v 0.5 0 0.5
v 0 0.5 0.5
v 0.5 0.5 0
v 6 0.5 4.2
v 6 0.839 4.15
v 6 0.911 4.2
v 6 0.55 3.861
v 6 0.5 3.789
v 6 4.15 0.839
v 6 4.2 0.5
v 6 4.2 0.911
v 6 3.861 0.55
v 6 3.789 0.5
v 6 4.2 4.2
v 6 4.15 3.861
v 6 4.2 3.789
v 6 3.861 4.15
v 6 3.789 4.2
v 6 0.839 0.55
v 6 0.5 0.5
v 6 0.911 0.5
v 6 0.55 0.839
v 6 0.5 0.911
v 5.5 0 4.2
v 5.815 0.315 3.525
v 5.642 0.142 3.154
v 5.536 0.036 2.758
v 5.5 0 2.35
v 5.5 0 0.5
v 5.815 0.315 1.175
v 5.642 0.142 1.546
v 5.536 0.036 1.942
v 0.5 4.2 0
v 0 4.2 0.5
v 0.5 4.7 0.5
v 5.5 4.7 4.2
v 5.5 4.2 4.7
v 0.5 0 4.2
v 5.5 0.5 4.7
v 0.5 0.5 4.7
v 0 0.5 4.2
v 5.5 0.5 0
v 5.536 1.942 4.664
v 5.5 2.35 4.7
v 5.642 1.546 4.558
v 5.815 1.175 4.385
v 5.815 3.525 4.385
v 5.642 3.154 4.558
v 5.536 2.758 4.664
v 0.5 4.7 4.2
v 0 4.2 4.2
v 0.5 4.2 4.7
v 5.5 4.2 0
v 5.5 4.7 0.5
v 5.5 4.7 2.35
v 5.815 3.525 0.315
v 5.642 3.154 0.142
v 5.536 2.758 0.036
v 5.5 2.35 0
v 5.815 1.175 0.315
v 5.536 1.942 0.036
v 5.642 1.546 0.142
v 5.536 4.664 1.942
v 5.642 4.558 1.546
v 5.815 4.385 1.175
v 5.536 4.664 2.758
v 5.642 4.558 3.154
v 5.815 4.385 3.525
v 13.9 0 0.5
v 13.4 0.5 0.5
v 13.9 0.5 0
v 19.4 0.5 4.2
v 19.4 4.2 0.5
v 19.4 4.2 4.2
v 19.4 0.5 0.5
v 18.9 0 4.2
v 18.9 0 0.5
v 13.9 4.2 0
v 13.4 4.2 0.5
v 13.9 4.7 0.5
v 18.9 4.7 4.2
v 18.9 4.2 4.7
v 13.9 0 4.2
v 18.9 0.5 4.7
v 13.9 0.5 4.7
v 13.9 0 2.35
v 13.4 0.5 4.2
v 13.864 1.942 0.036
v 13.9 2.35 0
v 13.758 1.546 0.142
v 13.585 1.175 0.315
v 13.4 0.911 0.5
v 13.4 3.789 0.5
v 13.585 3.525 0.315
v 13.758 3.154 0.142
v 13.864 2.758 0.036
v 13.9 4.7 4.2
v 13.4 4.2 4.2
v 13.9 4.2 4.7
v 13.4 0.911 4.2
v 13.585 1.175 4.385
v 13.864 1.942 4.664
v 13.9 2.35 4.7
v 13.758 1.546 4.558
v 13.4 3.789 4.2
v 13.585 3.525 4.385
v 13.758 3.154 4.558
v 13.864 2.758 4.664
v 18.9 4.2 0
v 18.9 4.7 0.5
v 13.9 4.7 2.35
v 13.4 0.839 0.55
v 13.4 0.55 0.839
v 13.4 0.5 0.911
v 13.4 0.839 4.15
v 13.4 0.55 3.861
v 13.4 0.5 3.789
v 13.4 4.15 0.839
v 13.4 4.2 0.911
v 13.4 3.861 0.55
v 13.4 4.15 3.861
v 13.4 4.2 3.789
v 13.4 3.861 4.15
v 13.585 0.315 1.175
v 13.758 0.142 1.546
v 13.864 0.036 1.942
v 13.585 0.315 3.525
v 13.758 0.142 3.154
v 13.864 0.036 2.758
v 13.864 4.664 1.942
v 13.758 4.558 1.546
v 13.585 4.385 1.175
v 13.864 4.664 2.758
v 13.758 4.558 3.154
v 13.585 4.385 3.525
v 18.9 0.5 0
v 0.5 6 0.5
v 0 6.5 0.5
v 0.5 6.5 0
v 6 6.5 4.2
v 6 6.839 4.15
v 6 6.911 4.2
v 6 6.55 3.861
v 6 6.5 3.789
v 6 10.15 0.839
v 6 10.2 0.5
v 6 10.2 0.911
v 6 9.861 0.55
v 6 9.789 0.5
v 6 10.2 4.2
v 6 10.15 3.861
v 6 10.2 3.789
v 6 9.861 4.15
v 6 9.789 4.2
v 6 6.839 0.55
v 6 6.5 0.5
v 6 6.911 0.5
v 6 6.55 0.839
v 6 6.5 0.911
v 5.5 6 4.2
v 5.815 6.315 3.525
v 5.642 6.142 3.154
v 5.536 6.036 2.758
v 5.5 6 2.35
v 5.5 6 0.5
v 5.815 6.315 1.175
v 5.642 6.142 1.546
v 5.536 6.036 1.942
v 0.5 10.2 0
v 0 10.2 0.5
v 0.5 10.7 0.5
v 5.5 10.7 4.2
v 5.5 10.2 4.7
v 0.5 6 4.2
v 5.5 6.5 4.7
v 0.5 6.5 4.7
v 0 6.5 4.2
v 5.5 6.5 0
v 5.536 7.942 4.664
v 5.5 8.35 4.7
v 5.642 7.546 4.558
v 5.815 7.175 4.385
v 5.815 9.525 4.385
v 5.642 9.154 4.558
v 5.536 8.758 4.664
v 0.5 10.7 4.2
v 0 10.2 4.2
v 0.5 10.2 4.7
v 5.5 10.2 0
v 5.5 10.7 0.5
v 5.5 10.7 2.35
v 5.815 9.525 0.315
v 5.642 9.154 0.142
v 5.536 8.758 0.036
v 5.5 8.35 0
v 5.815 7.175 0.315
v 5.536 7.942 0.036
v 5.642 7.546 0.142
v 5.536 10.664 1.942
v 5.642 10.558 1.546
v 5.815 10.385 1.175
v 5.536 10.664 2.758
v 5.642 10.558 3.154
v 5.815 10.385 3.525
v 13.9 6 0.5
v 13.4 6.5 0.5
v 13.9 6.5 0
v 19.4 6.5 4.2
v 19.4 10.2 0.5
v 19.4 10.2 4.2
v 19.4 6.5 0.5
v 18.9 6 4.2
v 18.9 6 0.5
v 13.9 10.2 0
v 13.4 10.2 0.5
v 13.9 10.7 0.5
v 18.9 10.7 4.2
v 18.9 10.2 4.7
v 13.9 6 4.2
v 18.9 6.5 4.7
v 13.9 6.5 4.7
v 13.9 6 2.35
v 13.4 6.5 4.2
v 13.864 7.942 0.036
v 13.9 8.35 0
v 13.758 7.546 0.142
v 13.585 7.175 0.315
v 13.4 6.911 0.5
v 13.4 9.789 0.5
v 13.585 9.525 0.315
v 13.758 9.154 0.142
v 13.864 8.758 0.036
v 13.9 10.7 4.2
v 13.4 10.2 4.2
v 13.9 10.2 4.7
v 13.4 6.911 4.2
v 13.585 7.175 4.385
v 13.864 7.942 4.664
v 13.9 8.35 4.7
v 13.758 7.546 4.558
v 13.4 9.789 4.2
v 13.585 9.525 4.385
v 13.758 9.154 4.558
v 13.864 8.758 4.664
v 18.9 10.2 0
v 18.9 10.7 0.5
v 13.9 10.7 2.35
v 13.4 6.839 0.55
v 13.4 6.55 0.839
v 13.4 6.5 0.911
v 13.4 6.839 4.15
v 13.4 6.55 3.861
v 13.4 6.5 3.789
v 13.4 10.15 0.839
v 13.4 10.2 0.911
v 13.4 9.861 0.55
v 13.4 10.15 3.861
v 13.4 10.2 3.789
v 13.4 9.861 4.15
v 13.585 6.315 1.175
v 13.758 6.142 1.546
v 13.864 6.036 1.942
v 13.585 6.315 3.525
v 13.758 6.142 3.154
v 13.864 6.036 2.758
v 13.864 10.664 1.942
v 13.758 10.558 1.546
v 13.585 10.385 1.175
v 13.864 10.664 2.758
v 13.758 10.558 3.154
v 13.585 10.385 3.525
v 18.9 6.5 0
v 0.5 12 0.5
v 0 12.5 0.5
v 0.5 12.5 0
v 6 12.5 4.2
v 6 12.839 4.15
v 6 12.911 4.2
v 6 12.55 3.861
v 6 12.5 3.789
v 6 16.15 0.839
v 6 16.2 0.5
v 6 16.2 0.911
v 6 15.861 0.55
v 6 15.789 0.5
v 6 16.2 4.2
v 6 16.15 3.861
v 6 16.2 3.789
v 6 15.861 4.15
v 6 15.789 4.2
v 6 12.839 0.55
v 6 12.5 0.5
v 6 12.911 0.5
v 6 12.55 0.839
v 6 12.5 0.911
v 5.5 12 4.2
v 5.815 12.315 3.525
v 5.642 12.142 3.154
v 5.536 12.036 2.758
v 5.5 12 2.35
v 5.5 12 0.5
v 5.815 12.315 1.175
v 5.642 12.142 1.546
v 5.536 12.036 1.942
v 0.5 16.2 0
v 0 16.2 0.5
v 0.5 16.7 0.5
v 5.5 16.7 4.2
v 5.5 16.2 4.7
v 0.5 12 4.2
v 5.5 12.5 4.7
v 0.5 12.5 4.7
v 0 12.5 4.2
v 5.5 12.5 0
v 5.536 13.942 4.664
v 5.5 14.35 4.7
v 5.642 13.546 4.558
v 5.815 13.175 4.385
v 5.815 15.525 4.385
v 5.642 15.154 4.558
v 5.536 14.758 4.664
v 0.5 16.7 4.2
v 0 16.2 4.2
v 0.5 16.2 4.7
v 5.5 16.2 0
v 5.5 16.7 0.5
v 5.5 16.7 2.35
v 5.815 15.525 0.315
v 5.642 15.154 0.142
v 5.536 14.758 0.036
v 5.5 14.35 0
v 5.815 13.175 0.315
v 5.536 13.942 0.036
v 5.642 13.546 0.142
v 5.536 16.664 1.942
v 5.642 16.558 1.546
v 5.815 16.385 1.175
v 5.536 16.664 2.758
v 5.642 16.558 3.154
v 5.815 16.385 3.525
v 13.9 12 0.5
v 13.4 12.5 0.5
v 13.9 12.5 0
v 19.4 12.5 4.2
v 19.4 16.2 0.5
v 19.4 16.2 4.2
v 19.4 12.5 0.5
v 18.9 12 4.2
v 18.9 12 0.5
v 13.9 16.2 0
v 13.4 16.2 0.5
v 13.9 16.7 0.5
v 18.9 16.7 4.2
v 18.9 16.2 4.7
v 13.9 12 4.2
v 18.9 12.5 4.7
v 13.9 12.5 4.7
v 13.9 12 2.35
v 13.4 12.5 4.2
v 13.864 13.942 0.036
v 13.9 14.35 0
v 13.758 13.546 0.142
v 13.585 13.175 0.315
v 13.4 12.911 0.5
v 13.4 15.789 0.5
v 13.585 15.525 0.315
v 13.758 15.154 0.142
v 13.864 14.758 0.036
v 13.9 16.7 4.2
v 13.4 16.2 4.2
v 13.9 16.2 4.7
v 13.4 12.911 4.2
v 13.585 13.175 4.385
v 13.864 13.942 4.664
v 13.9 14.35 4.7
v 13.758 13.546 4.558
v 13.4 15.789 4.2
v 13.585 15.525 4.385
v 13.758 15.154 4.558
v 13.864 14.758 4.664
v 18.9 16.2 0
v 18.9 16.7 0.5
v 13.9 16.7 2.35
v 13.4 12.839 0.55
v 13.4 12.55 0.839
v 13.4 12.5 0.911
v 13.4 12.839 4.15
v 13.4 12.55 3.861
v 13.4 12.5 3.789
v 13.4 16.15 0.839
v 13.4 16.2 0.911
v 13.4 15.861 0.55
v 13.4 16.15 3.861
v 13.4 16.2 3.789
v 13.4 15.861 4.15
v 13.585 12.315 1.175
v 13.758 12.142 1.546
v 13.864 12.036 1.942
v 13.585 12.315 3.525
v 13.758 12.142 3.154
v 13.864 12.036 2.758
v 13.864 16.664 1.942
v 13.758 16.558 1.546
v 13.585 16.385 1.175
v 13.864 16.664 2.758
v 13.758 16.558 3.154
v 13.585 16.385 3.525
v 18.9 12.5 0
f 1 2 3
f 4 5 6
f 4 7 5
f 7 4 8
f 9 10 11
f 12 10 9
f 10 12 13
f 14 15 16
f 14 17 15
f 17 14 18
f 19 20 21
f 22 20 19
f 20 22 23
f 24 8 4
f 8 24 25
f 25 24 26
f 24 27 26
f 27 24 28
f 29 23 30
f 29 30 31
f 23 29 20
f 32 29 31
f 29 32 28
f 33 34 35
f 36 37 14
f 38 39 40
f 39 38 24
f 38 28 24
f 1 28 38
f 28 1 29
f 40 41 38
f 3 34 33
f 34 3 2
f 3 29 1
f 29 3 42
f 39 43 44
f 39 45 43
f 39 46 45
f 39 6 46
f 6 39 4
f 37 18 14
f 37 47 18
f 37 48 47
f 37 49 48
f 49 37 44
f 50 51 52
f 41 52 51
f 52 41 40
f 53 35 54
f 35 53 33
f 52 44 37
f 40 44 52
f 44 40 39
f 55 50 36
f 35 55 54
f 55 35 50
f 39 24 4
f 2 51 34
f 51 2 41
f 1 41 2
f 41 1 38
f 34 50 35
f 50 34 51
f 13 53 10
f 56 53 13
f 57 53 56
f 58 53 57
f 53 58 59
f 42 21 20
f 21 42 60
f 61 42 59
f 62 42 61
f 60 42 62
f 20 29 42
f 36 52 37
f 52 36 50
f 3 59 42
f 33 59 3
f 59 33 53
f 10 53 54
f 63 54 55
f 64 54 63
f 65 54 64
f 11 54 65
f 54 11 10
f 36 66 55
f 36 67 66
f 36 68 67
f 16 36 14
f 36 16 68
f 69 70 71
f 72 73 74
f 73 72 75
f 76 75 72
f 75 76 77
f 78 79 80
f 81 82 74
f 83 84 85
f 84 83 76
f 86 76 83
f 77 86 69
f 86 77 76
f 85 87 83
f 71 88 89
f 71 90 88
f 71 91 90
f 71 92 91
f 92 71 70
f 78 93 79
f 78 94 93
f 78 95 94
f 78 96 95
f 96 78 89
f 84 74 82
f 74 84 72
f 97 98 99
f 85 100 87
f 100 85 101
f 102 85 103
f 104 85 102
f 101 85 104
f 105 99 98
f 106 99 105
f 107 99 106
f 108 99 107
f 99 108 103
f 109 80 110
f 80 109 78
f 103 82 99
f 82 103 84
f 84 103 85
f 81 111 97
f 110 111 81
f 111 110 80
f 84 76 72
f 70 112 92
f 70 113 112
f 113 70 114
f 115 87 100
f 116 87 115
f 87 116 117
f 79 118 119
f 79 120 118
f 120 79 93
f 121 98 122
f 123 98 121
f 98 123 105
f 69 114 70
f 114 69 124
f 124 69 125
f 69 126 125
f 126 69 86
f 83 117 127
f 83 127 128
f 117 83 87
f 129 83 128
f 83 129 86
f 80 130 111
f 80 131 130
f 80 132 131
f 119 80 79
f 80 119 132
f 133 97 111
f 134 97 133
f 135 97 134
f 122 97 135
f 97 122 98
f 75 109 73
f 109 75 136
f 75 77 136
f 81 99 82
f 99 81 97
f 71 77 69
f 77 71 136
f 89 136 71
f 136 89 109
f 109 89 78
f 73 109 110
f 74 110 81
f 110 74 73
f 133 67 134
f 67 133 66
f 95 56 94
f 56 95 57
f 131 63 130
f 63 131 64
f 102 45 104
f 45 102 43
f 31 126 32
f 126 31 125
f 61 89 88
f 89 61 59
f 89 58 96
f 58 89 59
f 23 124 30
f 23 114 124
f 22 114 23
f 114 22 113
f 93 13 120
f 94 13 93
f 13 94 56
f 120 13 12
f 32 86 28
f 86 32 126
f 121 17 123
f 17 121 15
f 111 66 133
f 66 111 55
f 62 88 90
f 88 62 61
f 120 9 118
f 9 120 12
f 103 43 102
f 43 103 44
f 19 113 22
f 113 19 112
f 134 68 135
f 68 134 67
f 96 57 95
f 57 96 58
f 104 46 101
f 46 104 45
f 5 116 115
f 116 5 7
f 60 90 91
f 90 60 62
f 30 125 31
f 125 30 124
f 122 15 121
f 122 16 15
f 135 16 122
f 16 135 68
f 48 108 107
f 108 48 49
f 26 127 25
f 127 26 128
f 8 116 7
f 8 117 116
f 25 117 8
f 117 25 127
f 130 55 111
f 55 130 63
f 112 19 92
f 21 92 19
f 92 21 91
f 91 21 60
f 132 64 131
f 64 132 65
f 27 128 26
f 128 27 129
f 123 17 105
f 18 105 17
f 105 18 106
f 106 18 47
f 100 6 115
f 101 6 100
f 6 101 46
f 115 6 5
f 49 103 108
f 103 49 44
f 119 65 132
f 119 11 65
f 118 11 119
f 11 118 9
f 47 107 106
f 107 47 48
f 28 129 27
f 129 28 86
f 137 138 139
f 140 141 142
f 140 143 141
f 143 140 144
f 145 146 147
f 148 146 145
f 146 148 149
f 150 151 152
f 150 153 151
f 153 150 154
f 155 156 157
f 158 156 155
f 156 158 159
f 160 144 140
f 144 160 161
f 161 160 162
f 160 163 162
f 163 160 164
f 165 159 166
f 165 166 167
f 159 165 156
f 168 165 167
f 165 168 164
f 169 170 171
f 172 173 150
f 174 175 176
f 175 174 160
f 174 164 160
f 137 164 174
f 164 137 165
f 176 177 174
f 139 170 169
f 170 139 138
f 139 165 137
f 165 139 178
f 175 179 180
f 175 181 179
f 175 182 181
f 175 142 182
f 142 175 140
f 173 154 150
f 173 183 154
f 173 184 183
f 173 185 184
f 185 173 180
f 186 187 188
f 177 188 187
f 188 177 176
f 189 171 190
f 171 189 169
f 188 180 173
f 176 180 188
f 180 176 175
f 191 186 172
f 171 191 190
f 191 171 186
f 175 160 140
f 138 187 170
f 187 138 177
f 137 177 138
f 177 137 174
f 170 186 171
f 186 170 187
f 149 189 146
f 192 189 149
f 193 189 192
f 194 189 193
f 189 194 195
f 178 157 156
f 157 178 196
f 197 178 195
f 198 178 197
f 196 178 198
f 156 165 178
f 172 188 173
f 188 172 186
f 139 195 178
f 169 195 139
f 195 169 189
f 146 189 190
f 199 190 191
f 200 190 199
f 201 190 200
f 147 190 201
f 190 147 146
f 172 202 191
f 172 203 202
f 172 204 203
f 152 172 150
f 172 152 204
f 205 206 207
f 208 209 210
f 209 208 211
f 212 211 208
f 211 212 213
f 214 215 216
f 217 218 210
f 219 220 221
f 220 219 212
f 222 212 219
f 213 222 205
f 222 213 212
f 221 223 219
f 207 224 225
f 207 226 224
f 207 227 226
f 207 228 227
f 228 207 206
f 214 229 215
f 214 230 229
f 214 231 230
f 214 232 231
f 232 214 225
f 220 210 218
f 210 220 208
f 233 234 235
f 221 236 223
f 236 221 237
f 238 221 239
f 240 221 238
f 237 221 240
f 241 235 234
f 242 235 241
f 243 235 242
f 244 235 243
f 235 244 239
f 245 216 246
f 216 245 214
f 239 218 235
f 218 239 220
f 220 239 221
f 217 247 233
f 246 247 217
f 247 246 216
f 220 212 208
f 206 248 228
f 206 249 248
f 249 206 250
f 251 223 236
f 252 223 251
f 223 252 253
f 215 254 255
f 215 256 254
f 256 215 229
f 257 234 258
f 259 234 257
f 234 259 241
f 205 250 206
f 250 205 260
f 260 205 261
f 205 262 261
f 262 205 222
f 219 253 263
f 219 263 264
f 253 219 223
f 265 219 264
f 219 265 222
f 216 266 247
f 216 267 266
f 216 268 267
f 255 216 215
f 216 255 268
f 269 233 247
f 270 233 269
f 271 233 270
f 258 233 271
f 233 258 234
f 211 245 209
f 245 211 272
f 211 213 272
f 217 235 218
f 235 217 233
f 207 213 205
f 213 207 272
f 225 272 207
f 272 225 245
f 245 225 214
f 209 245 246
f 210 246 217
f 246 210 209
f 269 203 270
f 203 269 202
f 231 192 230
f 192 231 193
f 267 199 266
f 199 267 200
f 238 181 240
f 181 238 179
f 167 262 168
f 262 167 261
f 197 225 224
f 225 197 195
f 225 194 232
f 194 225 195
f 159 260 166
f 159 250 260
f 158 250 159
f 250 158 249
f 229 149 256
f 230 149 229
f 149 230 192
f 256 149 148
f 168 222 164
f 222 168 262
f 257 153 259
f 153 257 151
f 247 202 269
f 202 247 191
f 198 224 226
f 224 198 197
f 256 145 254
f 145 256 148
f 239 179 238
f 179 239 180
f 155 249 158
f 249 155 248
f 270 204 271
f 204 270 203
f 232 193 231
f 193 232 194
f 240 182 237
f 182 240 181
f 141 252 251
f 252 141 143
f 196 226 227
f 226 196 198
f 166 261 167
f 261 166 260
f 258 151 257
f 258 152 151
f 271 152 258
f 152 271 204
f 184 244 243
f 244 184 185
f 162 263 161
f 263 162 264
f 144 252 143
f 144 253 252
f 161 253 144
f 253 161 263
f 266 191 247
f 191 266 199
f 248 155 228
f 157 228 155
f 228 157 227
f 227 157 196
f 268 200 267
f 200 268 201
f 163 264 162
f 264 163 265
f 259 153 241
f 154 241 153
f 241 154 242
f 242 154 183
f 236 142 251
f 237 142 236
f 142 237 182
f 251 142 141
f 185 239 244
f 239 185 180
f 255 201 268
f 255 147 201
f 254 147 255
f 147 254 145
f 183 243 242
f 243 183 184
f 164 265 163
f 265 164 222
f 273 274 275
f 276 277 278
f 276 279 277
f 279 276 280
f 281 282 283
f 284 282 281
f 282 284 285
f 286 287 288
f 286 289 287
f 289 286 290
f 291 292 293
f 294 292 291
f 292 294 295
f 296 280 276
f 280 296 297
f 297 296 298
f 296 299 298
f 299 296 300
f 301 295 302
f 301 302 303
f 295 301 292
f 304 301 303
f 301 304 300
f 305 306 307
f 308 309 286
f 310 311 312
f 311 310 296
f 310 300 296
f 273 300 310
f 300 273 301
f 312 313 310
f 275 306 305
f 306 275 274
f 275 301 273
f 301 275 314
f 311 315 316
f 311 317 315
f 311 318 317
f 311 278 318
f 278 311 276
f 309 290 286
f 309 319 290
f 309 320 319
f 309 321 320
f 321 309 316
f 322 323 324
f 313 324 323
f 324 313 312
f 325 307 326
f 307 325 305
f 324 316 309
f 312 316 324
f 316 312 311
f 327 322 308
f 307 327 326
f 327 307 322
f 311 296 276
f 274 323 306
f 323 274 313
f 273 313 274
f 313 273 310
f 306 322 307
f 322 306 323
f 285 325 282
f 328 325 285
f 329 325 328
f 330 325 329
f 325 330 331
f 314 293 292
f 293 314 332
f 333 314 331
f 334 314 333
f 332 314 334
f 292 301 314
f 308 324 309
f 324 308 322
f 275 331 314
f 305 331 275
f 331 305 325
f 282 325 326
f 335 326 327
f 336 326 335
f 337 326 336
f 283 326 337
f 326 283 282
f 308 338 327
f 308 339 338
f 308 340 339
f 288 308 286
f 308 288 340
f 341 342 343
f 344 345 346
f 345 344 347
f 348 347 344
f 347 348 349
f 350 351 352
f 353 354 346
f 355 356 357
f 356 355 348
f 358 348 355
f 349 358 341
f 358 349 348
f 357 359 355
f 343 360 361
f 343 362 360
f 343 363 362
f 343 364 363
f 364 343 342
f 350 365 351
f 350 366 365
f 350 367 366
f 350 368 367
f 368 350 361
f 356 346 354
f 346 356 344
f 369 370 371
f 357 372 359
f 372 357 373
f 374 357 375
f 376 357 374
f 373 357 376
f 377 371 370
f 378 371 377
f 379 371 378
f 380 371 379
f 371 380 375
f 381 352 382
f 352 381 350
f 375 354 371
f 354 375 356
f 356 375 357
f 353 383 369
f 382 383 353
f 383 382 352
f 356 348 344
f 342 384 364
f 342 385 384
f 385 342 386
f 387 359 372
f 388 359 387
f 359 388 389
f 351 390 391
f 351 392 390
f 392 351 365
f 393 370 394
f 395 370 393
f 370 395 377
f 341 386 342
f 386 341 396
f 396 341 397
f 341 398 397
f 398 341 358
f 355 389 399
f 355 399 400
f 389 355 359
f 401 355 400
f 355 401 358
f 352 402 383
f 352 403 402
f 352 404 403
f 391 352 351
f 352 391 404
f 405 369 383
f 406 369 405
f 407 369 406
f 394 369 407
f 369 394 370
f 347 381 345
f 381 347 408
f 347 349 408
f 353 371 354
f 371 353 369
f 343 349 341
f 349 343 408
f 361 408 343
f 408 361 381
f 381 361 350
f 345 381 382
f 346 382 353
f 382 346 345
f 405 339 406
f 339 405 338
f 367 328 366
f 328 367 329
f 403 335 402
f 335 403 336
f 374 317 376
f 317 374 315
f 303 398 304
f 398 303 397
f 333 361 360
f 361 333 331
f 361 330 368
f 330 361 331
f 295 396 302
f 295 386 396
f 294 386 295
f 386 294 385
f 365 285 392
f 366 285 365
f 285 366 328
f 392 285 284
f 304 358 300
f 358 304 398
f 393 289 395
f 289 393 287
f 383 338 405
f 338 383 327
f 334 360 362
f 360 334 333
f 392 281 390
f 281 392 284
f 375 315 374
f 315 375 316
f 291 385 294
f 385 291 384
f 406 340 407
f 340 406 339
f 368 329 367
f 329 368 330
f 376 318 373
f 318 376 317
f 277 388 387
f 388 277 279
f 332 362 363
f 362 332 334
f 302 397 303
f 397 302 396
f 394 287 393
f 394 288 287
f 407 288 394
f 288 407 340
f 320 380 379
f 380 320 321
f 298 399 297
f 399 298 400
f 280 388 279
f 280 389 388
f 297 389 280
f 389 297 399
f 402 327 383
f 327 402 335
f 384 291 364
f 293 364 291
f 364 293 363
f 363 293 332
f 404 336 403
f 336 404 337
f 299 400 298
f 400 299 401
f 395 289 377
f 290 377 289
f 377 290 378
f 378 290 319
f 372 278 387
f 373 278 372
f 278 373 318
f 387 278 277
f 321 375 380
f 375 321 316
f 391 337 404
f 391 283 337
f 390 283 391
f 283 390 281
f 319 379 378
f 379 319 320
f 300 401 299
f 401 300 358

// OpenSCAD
// file: link.scad
include <barrel2.scad>
include <common.scad>

pin_diameter = 3.175;
pin_hole_diameter = pin_diameter + loose;

main_diameter = 13;
link_thickness = 12;
link_height = 14;

module front_link_2d(length) {
  difference() {
    union() {
      hull() {
        circle(d=main_diameter);
        translate([0, length])
          circle(d=main_diameter);
      }
      hull() {
        circle(d=main_diameter);
        translate([link_height, 0])
          octagon(main_diameter);
      }
    }
    
    for (xy = [[link_height, 0], [0, length]])
      translate(xy)
        octagon(pin_hole_diameter);
  }
}

module front_link(length) {
  rotate([0, -90, 0])
    linear_extrude(link_thickness)
      front_link_2d(length);
}

module rear_link_a_2d(length) {
  difference() {
    union() {
      hull() {
        translate([0, main_diameter])
          octagon(main_diameter);
        translate([0, length])
          circle(d=main_diameter);
      }

    }
    translate([0, length])
      octagon(pin_hole_diameter);
  }
}

module rear_link_b_2d() {
  difference() {
    hull() {
      octagon(main_diameter);    
      translate([link_height, 0])
        octagon(main_diameter);    
      translate([0, main_diameter*2])
        octagon(main_diameter);    
    }
    translate([link_height, 0])
      octagon(pin_hole_diameter);
  }
}

module rear_link(length) {  
  rotate([0, -90, 0]) {
    linear_extrude(link_thickness)
      rear_link_a_2d(length);
    
    for (z = [-link_thickness/2, link_thickness + loose/2])
      translate([0, 0, z])
        linear_extrude(link_thickness/2 - loose/2)
          rear_link_b_2d();
    
    for (z = [-loose/2, link_thickness]) {
      translate([0, 0, z]) {
        linear_extrude(loose/2) {
          intersection() {
            rear_link_a_2d(length);
            rear_link_b_2d();
          }
        }
      }
    }
  }
}

module link_pair(stroke) {
  // Avoid over-angling.
  min_separation = 4 * main_diameter;
  max_separation = min_separation + stroke;
  link_length = max_separation / 2;

  translate([link_thickness, 0, 0])  
    rear_link(link_length);
  translate([-link_thickness, 0, 0])  
    front_link(link_length);
}

module link_anchor_2d(hole = true, spread) {
  difference() {
    hull() {
      translate([link_height - slider_wall, 0])
        circle(d=main_diameter);
      translate([-main_diameter/2, -main_diameter/2])
        square([eps, main_diameter * (1 + spread)]);
    }
    if (hole)
      translate([link_height - slider_wall, 0])
        octagon(pin_hole_diameter);
  }
}

link_anchor_play = 1.5;
link_anchor_thickness = link_thickness + link_anchor_play;

module link_anchor(spread = 1) {
  translate([main_diameter/2, 0, 0]) {
    difference() {
      linear_extrude(link_anchor_thickness)
        link_anchor_2d(spread=spread);
      translate([main_diameter/2 - slider_wall, -15, link_thickness/2 + loose/2 + link_anchor_play])
        cube([40, 40, link_thickness - loose]);
    }
    
    wall = slider_width/2 - link_anchor_thickness;
    translate([0, 0, -wall])
      linear_extrude(wall)
        link_anchor_2d(hole=false, spread=spread);
  }
}
// file: barrel2.scad
include <common.scad>

// 120 is about the limit of the cams.
stroke = 110;
trigger_width = 8;
trigger_cavity_width = trigger_width + extra_loose;
trigger_cavity_length = 20;

barrel_length = 220;

// Tall enough for the string.
//
// TODO: Consider making this slightly wider, to avoid friction with string.
barrel_gap = 4;

// Should be wide enough to accommodate whatever bore structure we
// want.
barrel_width = 22;
barrel_height = 33;

slider_wall = 7;
slider_width = barrel_width + 2*slider_wall;
slider_height = barrel_height + 2*slider_wall;

barrel_lug_x = 3;
barrel_lug_y = 5;

// Tested with several darts.
main_bore = 13.8;

zip_channel_height = 3.2;
zip_channel_width = 6.5;

module barrel(trigger_slot=false) {
  // Make the bore with high precision.
  $fa = 5;
  
  difference() {
    union() {
      // Main length.
      translate([-barrel_width/2, 0, 0])
        cube([barrel_width, barrel_length, barrel_height/2 - barrel_gap/2]);
      
      // Lugs on one end for attaching to a fixed piece.
      translate([-barrel_width/2 - barrel_lug_x, 0, 0])
        cube([barrel_width + barrel_lug_x*2, barrel_lug_y, barrel_height/2 - barrel_gap/2]);
    }
    
    // Bore.
    translate([0, -eps, barrel_height/2])
      rotate([-90, 0, 0])
        cylinder(barrel_length+2*eps, d=main_bore);
            
    // Outside foot chamfers.
    for (x = barrel_width/2 * [-1, 1])
      translate([x, 0, 0])
        rotate([0, 45, 0])
          cube([sqrt(0.32), barrel_length*2+eps, sqrt(0.32)], center=true);
    
    if (trigger_slot) {
      // Trigger slot.
      translate([-trigger_cavity_width/2, -eps, -eps])
        cube([trigger_cavity_width, trigger_cavity_length, barrel_height]);  

      // Inside foot chamfers.
      for (x = trigger_cavity_width/2 * [-1, 1])
        translate([x, trigger_cavity_length/2, 0])
          rotate([0, 45, 0])
            cube([sqrt(0.32), trigger_cavity_length, sqrt(0.32)], center=true);
    }
  }
  
  if (trigger_slot) {
    // Add a slight bridge (where it won't hit the trigger) to keep things spaced.
    translate([-barrel_width/2, 0, 0])
      cube([barrel_width, 5, 3]);
  }
    
  // Brims to prevent warping.
  brim_lip_x = 7;
  brim_lip_y = 5;
  brim_thickness = 0.4;
  difference() {
    translate([-barrel_width/2-brim_lip_x, -brim_lip_y, 0])
      cube([barrel_width + 2*brim_lip_x, barrel_length + 2*brim_lip_y, brim_thickness]);
    translate([-barrel_width/2-brim_lip_x - 0.5, brim_lip_y, -eps])
      cube([barrel_width + 2*brim_lip_x + 1, barrel_length - 2*brim_lip_y, 1]);
  }
}

module slider(length, slot=7.5, zip_channels=[]) {
  difference() {
    union() {
      difference() {
        cube([slider_width, length, slider_height], center=true);
        
        // Add 0.1 to the horizontal clearance, since we are bolting these parts
        // together tightly.
        cube([barrel_width + loose + 0.1, length + 1, barrel_height + loose], center=true);
        
        // Carve out corners, in case the printer cuts corners.
        for (x = barrel_width * [-0.5, 0.5], z = barrel_height * [-0.5, 0.5])
          translate([x, 0, z])
            rotate([0, 45, 0])
              cube([0.9, length + 1, 0.9], center=true);
        
        // Slot for lug on the end of the barrel.
        translate([0, length/2 - slot, 0]) {
          cube([
            barrel_width + 2*barrel_lug_x + snug,
            barrel_lug_y + snug + 0.1,  // Add 0.1 to account for inaccuracies in bridging.
            barrel_height + loose
          ], center=true);
        }
      }

      // Lugs which slide between two barrel halves.
      lug_height = barrel_gap - snug;
      lug_intrusion = 3;
      difference() {
        cube([slider_width, length, lug_height], center=true);
        cube([barrel_width - 2*lug_intrusion, length + 1, lug_height + 1], center=true);
        
        // End chamfers.
        for (y = length/2 * [-1, 1], z = lug_height/2 * [-1, 1])
          translate([0, y, z])
            rotate([45, 0, 0])
              cube([slider_width, 1.5, 1.5], center=true);
        
        // Length chamfers.
        for (x = (barrel_width - 2*lug_intrusion)/2 * [-1, 1], z = lug_height/2 * [-1, 1])
          translate([x, 0, z])
            rotate([0, 45, 0])
              cube([1, length, 1], center=true);
      }
    }
    
    // Zip tie channel.
    for (y = zip_channels) {
      translate([0, zip_channel_width/2 - length/2 + y, 0]) {
        rotate([90, 0, 0]) {
          linear_extrude(zip_channel_width) {
            difference() {
              offset(slider_wall + zip_channel_height)
                square([barrel_width - slider_wall - 2, barrel_height + eps], center=true);
              offset(slider_wall)
                square([barrel_width - slider_wall - 2, barrel_height + eps], center=true);
            }
          }
        }
      }
    }
  }
}

module barrel_print() {
  barrel();
  translate([barrel_width + barrel_lug_x + 2, barrel_length, 0])
    rotate([0, 0, 180])
      barrel();
}
// file: common.scad
$fa = 10;
$fs = 0.2;
eps = 0.003;
$zstep = 0.2;

// An inward chamfer sufficient to prevent elephant's foot.
foot = 0.4;

// FINDINGS FROM CLEARANCE TEST
//
// Consider a vertical hole of width X, a layer height of 0.2, and a vertical
// post.
//   * A post of diameter X will not fit in.
//   * A post of diameter X-0.1 will fit in, but is very hard to slide in or out.
//     This is probably due mostly to the transverse grain of the print.
//     It will rotate, but with some resistance.
//   * A post of diameter X-0.2 slides in and out easily. It rotates easily, but
//     still has noticeable resistance at some points.
//   * A post of diameter X-0.3 rotates freely. It also has noticeable play
//     from side to side.
//
// Clearances are expressed as the total across both sides of a joint.
tight = 0.1;  // Intended for stationary joints.
snug = 0.2;   // Moves, but with some resistance.
loose = 0.3;  // Free movement.
extra_loose = 0.4;

// A brim is a 0.2mm layer printed near an edge which is likely to warp.
// The edge should be chamfered outwards at 45 degrees. The brim should
// be placed this far from the bottom of the edge, so it barely touches
// the chamfer.
brim_offset = 0.3;

// Menards 5/8 x 2-3/4 x 0.04 WG compression spring.
spring_od = 5/8 * 25.4;
// Subtract 10 from the relaxed length so everything is slightly tensioned
// all the time.
spring_max_length = 2.75 * 25.4 - 10;
spring_min_length = 16;  // Approximate.

// Menards 1/4 inch aluminum rod.
roller_diameter = 6.7;
roller_cavity_diameter = roller_diameter + loose;

// 550 paracord. Make this wide enough to accommodate a melted end.
string_diameter = 4.5;

// Standard spring tube.
tube_id = spring_od + 0.7;

module octagon(diameter) {
  intersection_for(a = [0, 45])
    rotate([0, 0, a])
      square(diameter, center=true);
}

// A cylinder with chamfered or flared ends, useful for dealing with
// elephant's foot on pins or holes.
module flare_cylinder(height, radius, flare_top, flare_bottom) {
  translate([0, 0, abs(flare_bottom)-eps])
    cylinder(height-abs(flare_bottom)-abs(flare_top)+eps, radius, radius);

  // Bottom flare.
  linear_extrude(abs(flare_bottom), scale=radius/(radius-flare_bottom))
    circle(radius-flare_bottom);
  
  // Top flare.
  translate([0, 0, height-abs(flare_top)])
    linear_extrude(abs(flare_top), scale=(radius-flare_top)/radius)
      circle(radius);
}

// A cube with a chamfered or flared bottom end, useful for dealing
// with elephant's foot on pins or holes.
module flare_cube(dims, flare) {
  translate([0, 0, abs(flare)-eps])
    cube([dims.x, dims.y, dims.z - abs(flare) + eps]);

  translate([dims.x/2, dims.y/2, 0])
    linear_extrude(abs(flare), scale=[dims.x/(dims.x-2*flare), dims.y/(dims.y-2*flare)])
      translate([-(dims.x-2*flare)/2, -(dims.y-2*flare)/2, abs(flare)-eps])
        square([dims.x-2*flare, dims.y-2*flare]);
}

// An approximate circle which can be printed on its side.
module circle_ish(r) {
  // Safe overhang angle.
  q = 45;
  
  intersection() {
    // Add 0.2 (one print layer) in case the bridge is messy and hangs
    // down.
    square(2*r+0.2, center=true);
    hull() {
      circle(r);
      for (a = [-1, 1])
        translate([0, a*r/cos(q), 0])
          square(eps, center=true);
    }
  }
}

// Depth of the sockets used as glue aids.
socket_depth = 5;

module socket() {
  translate([-1.5, -1.5, -eps])
    flare_cube([3, 3, socket_depth], -foot);
}

module lug() {
  flare_cube([3-snug, 3-snug, 2*socket_depth-2], foot);
}

// Nerf darts are 0.50 cal.
dart_diameter = 12.7;
dart_length = 72;

module octahedron(major_radius=1) {
  // Top and bottom halves.
  for (a = [-1, 1])
    scale([1, 1, a])
      // Extrude a square into a pyramid.
      linear_extrude(major_radius, scale=0)
        rotate([0, 0, 45])
          square(sqrt(2)*major_radius, center=true);
}

module chamfered_cube(dims, chamfer=1) {
  assert(dims.x >= 2*chamfer);
  assert(dims.y >= 2*chamfer);
  assert(dims.z >= 2*chamfer);

  hull()
    for (a = [0, 1], b = [0, 1], c = [0, 1])
        translate([
          (dims.x - 2*chamfer) * a + chamfer,
          (dims.y - 2*chamfer) * b + chamfer,
          (dims.z - 2*chamfer) * c + chamfer
        ])
          octahedron(chamfer);
}
// main file
include <common.scad>
include <barrel2.scad>
include <link.scad>
 
receiver_length = 95;
trigger_pivot_diameter = 6;
trigger_pivot_x = 3;
trigger_pivot_y = (71-receiver_length)/2;
grip_length = 53;
grip_height = 85;
trigger_length = 31;

grip_lug_dims = [6, 25, 57];

module grip() {
  circle_diameter = slider_width*0.9;
  
  // Gendered lug to hold the two halves together.
  grip_lug_dims = [6, 25, 57];
  lug_translate = [0, 6, 10];
  lug_rotate = [14, 0, 0];
  
  difference() {
    intersection() {
      hull() {
        for (y = (grip_length/2 - circle_diameter/2) * [-1, 1]) {
          translate([0, y + grip_height*0.25, 0])
            linear_extrude(eps)
              circle(circle_diameter/2-2);
          translate([0, y + grip_height*0.25, 2])
            linear_extrude(eps)
              circle(circle_diameter/2);
          translate([0, y, grip_height])
            sphere(circle_diameter/2);
        }
      }
        
      translate([-slider_width/2 + 4, -100, 0])
        cube([slider_width/2 - 4, 200, grip_height + circle_diameter/2]);
    }
    
    // Cavity for interlocking lug.
    translate(lug_translate - [grip_lug_dims.x + 0.5, 0, 0])
      rotate(lug_rotate)
        translate([0, -loose/2, -loose/2])
          cube(grip_lug_dims + [0.5 + eps, loose, loose]);
  }
}

module grip_lug() {
  rotate([90, 0, 0])
    // Subtract one layer (0.2mm) to make sure it fits nicely.
    chamfered_cube(grip_lug_dims + [grip_lug_dims.x, -0.2, 0], 0.9);
}

band_post_diameter = 5 - loose;
post_hole_depth = 6;

module band_post() {
  length = post_hole_depth*2 + trigger_cavity_width - 1;

  for (x = [0, length - post_hole_depth])
    translate([x, 0, 0])
      chamfered_cube([post_hole_depth, band_post_diameter, band_post_diameter], 0.5);
  
  translate([1, band_post_diameter/2, band_post_diameter/2])
    rotate([0, 90, 0])
      cylinder(length-2, d=band_post_diameter);
}

module receiver() {
  lug_offset = 25;
  trigger_cavity_y = lug_offset + barrel_lug_y/2 + 0.3;

  difference() {
    union() {
      intersection() {
        union() {
          translate([0, 0, 0])
            rotate([0, 90, 0])
              slider(receiver_length, slot=receiver_length-lug_offset, zip_channels=[34]);
          
          translate([slider_height/2, -receiver_length/2 + main_diameter/2, -link_anchor_thickness])
            rotate([0, 0, 0])
              link_anchor(spread=0.55);
        }
        
        // Remove the top half.
        translate([0, 0, -slider_width/4])
          cube([150, receiver_length, slider_width/2], center=true);
      }
      
      // Wall of trigger chamber.
      translate([-1, trigger_cavity_y - receiver_length/2, -barrel_width/2-1])
        cube([barrel_height/2 + 2, receiver_length - trigger_cavity_y, barrel_width/2+1]);
       
      // Grip.
      translate([grip_height + slider_height/2, (155-receiver_length)/2 + 0.5, 0])
        rotate([0, -90, 0])
          grip();
    }
    
    // Angle the back of the receiver.
    translate([-30, 18, -slider_width/2 - eps])
      rotate([0, 0, 45])
        cube([50, 30, slider_width]);
    
    // Chamfer sharp corners near the grip.
    rear_chamfer = 5.6;
    translate([0, receiver_length/2, -slider_width/2])
      rotate([45, 0, 0])
        cube([slider_height+1, rear_chamfer, rear_chamfer], center=true);
    translate([slider_width/2 + rear_chamfer/2, receiver_length/2, -slider_width/2]) {
      rotate([45, 0, -45]) {
        hull() {
          cube([slider_height+1, rear_chamfer, rear_chamfer], center=true);
          translate([0, 10, -10])
            cube([slider_height+1, rear_chamfer, rear_chamfer], center=true);
        }
      }
    }
    translate([slider_height/2, receiver_length/2, -slider_width/2]) {
      rotate([0, 45, 0]) {
        hull() {
          cube([rear_chamfer, receiver_length + 10, rear_chamfer], center=true);
          cube([eps, receiver_length + 50, eps], center=true);
        }
      }
    }

    // Trigger slot.
    translate([-1 - eps, trigger_cavity_y - receiver_length/2 - eps, -trigger_cavity_width/2 - eps]) {
      linear_extrude(trigger_cavity_width/2 + 2*eps) {
        union() {
          square([slider_height/2 + 12, receiver_length - trigger_cavity_y - (receiver_length - 53.7) + 2*eps]);
          square([slider_height/2 + 5, receiver_length - trigger_cavity_y - (receiver_length - 85) + 2*eps]);
        }
      }
    }
    
    // Hollow in front to fit over the string in the collapsed position, so that the two
    // sliders can touch even with the string between them.
    translate([0, -receiver_length/2, -20])
      linear_extrude(20)
        octagon(9);
    
    // Slight cutout to strengthen the connection of the pivot pin against shearing.
    translate([trigger_pivot_x, trigger_pivot_y, -trigger_cavity_width/2 - 2])
      linear_extrude(10)
        circle(d=trigger_pivot_diameter-3.5);
    
    // Rubber band post holes.
    translate([0, 0, -trigger_cavity_width/2 - post_hole_depth])
      linear_extrude(post_hole_depth + eps)
        for (xy = [
          [3, 32],
          [12, 32],
          [21, 32],
          [21, 23],
          [21, 13],
        ])
          translate(xy)
            square(band_post_diameter + loose, center=true);
  }
  
  translate([0, 0, -trigger_cavity_width/2]) {
    // Trigger pivot post.
    linear_extrude(trigger_cavity_width/2) {
      translate([trigger_pivot_x, trigger_pivot_y]) {
        difference() {
          circle(d=trigger_pivot_diameter);
          circle(d=trigger_pivot_diameter-3.5);
        }
      }
    }
  }
  
  // Print aids.
  translate([0, 0, -slider_width/2]) {
    linear_extrude(0.4) {
      translate([-slider_height/2 + 5.5, -receiver_length/2 - 5])
        square(10, center=true);
      translate([-slider_height/2 - 5, -receiver_length/2 + 5.5])
        square(10, center=true);
    }
  }
  
  // Trigger guard.
  trigger_guard_width = 6;
  translate([slider_height/2 + trigger_length - 6.5, 0, -trigger_guard_width - link_thickness/2]) {
    translate([0, -30, 0])
      cube([4, 50, trigger_guard_width]);
    hull() {
      translate([0, -30, 0])
        cube([4, 2, trigger_guard_width]);
      translate([-10, -38, 0])
        cube([4, 2, trigger_guard_width]);
    }
  }
}

module trigger_2d() {  
  rod_length = 40;
  ring_diameter = trigger_pivot_diameter+9;

  // Pivot.
  difference() {
    $fn = 40;
    union() {
      hull() {
        circle(d=ring_diameter);
        
        rotate([0, 0, -10]) {
          translate([-5, trigger_width/2 - 4])
            square([ring_diameter + 5, trigger_offset + 4]);
        }
        
        // Forward stop.
        stop_length = 16;
        stop_thickness = 4;
        translate([0, -7.69])
          square([stop_length, stop_thickness]);
      }
      
      // Main rod.
      hull() {
        translate([0, -rod_length]) {
          translate([0, 8]) square([5, eps]);
          translate([0, 0]) square([5, eps]);
          translate([1, -10]) square(eps);
        }
      }
      hull() {
        translate([0, 8-rod_length]) square([5, eps]);
        translate([-ring_diameter/2, 0]) square([ring_diameter/2+2, eps]);
      }
      
      // Trigger.
      trigger_offset = 14;
      rotate([0, 0, -10]) {
        translate([10, trigger_offset]) {
          offset(r=trigger_width/2) {
            intersection() {
              // Limit the arc with a box.
              translate([0, -10])
                square([trigger_length, 20]);
              
              // Arc.
              arc_radius = 90;
              translate([7, -arc_radius]) {
                difference() {
                  $fn = 90;
                  circle(arc_radius);
                  circle(arc_radius-0.01);
                }
              }
            }
          }
        }
      }
    }
  }
    
  // String catch.
  catch_round = 3;
  catch_top_x = -barrel_gap/2 - catch_round - 1;
  difference() {
    hull() {
      translate([1, -rod_length]) {
        circle(d=catch_round);
        
        translate([0, -10+catch_round/2])
          circle(d=catch_round);
        
        translate([catch_top_x, 0])
          circle(d=catch_round);
      }
    }
    
    // Make the holding face slightly concave, so that the string doesn't
    // torque the trigger when under tension.
    circle(norm([rod_length, 1+catch_top_x]) - catch_round/2, $fn=180);
  }
}

// Print with 40% cubic infill.
module trigger() {
  difference() {
    union() {
      // Unchamfered part.
      translate([0, 0, -trigger_width/2+1.2])
        linear_extrude(trigger_width-2.4)
          trigger_2d();
      
      // Chamfers. Use big chamfers for two reasons:
      //   1. It helps the string slide off the catch.
      //   2. It makes the trigger feel nice.
      for (a = [-1, 1], b = [0:0.2:1])
        scale([1, 1, a])
          translate([0, 0, -trigger_width/2+b])
            linear_extrude(0.2)
              offset(b-1.2 - (a == 1 && b == 0 ? 0.2 : 0))
                trigger_2d();
    }
  
    // Slot for rubber band.
    translate([-0.5, 16.5, -1]) {
      difference() {
        linear_extrude(trigger_width)
          rotate([0, 0, -65])
            square([13, 30], center=true);
        linear_extrude(trigger_width/2 + 1 + eps, scale=1.4)
          circle(d=5);
      }
    }
    
    // Cut out the pivot hole, with just enough chamfer to prevent elephant foot.
    pivot_hole_diameter = trigger_pivot_diameter + extra_loose;
    for (a = [-1, 1]) {
      scale([1, 1, a]) {
        translate([0, 0, -trigger_width/2-eps]) {
          cylinder(trigger_width, d=pivot_hole_diameter);
          cylinder(0.5, d1=pivot_hole_diameter+1, d2=pivot_hole_diameter);
        }
      }
    }
  }
}

module preview(pulled=false) {
  receiver();
  translate([trigger_pivot_x, trigger_pivot_y, 0])
    rotate([0, 0, pulled ? 11 : 0])
      trigger();
}

for (i = [0, 1, 2])
translate([0, 6*i, 0])
band_post();
